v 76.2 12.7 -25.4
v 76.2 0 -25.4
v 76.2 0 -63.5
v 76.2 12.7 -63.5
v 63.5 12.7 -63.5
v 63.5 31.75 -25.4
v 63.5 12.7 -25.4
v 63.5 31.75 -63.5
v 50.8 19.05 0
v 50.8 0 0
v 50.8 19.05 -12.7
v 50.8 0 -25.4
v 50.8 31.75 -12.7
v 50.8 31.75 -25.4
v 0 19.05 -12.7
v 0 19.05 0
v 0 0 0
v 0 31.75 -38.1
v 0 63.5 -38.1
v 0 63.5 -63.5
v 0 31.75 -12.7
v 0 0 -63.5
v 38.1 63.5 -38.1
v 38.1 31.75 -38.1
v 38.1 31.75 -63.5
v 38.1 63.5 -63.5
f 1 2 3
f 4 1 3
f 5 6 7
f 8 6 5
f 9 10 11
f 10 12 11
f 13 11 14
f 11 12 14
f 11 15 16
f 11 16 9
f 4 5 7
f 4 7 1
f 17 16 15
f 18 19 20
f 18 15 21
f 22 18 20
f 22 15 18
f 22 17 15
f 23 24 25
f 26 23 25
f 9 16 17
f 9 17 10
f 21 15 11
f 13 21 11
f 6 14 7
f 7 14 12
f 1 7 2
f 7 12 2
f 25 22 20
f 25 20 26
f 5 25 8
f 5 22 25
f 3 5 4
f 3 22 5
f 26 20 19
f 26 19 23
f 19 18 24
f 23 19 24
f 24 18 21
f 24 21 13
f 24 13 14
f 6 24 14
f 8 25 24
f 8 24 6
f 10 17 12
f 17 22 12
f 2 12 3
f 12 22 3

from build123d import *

# Parameters (mm, degrees)
BOSS_EXTRUDE1_DEPTH = 31.75
SKETCH3_W           = 12.7
SKETCH3_H           = 38.1
CUT_EXTRUDE3_DEPTH  = 19.05
SKETCH6_W           = 50.8
SKETCH6_H           = 12.7
CUT_EXTRUDE5_DEPTH  = 44.45
SKETCH7_W           = 50.8
SKETCH7_H           = 19.05
BOSS_EXTRUDE2_DEPTH = 12.7
SKETCH8_W           = 38.1
SKETCH8_H           = 25.4
BOSS_EXTRUDE3_DEPTH = 31.75


with BuildPart() as part:
    # Sketch1 → Boss-Extrude1 (new body)
    with BuildSketch(Plane(origin=(0, 0, 0), x_dir=(1, 0, 0), z_dir=(0, 1, 0))):
        Polygon((0, 0), (50.8, 0), (50.8, 25.4), (76.2, 25.4), (76.2, 63.5), (0, 63.5), align=None)
    extrude(amount=BOSS_EXTRUDE1_DEPTH)

    # Sketch3 → Cut-Extrude3 (cut)
    with BuildSketch(Plane(origin=(0, 31.75, 0), x_dir=(1, 0, 0), z_dir=(0, 1, 0))):
        with Locations((69.85, 44.45)):
            Rectangle(SKETCH3_W, SKETCH3_H)
    extrude(amount=-CUT_EXTRUDE3_DEPTH, mode=Mode.SUBTRACT)

    # Sketch6 → Cut-Extrude5 (cut)
    with BuildSketch(Plane.XZ):
        with Locations((25.4, -6.35)):
            Rectangle(SKETCH6_W, SKETCH6_H)
    extrude(amount=-CUT_EXTRUDE5_DEPTH, mode=Mode.SUBTRACT)

    # Sketch7 → Boss-Extrude2 (add)
    with BuildSketch(Plane.XY.offset(-12.7)):
        with Locations((25.4, 9.525)):
            Rectangle(SKETCH7_W, SKETCH7_H)
    extrude(amount=BOSS_EXTRUDE2_DEPTH)

    # Sketch8 → Boss-Extrude3 (add)
    with BuildSketch(Plane(origin=(0, 31.75, 0), x_dir=(1, 0, 0), z_dir=(0, 1, 0))):
        with Locations((19.05, 50.8)):
            Rectangle(SKETCH8_W, SKETCH8_H)
    extrude(amount=BOSS_EXTRUDE3_DEPTH)


solid = part.part
